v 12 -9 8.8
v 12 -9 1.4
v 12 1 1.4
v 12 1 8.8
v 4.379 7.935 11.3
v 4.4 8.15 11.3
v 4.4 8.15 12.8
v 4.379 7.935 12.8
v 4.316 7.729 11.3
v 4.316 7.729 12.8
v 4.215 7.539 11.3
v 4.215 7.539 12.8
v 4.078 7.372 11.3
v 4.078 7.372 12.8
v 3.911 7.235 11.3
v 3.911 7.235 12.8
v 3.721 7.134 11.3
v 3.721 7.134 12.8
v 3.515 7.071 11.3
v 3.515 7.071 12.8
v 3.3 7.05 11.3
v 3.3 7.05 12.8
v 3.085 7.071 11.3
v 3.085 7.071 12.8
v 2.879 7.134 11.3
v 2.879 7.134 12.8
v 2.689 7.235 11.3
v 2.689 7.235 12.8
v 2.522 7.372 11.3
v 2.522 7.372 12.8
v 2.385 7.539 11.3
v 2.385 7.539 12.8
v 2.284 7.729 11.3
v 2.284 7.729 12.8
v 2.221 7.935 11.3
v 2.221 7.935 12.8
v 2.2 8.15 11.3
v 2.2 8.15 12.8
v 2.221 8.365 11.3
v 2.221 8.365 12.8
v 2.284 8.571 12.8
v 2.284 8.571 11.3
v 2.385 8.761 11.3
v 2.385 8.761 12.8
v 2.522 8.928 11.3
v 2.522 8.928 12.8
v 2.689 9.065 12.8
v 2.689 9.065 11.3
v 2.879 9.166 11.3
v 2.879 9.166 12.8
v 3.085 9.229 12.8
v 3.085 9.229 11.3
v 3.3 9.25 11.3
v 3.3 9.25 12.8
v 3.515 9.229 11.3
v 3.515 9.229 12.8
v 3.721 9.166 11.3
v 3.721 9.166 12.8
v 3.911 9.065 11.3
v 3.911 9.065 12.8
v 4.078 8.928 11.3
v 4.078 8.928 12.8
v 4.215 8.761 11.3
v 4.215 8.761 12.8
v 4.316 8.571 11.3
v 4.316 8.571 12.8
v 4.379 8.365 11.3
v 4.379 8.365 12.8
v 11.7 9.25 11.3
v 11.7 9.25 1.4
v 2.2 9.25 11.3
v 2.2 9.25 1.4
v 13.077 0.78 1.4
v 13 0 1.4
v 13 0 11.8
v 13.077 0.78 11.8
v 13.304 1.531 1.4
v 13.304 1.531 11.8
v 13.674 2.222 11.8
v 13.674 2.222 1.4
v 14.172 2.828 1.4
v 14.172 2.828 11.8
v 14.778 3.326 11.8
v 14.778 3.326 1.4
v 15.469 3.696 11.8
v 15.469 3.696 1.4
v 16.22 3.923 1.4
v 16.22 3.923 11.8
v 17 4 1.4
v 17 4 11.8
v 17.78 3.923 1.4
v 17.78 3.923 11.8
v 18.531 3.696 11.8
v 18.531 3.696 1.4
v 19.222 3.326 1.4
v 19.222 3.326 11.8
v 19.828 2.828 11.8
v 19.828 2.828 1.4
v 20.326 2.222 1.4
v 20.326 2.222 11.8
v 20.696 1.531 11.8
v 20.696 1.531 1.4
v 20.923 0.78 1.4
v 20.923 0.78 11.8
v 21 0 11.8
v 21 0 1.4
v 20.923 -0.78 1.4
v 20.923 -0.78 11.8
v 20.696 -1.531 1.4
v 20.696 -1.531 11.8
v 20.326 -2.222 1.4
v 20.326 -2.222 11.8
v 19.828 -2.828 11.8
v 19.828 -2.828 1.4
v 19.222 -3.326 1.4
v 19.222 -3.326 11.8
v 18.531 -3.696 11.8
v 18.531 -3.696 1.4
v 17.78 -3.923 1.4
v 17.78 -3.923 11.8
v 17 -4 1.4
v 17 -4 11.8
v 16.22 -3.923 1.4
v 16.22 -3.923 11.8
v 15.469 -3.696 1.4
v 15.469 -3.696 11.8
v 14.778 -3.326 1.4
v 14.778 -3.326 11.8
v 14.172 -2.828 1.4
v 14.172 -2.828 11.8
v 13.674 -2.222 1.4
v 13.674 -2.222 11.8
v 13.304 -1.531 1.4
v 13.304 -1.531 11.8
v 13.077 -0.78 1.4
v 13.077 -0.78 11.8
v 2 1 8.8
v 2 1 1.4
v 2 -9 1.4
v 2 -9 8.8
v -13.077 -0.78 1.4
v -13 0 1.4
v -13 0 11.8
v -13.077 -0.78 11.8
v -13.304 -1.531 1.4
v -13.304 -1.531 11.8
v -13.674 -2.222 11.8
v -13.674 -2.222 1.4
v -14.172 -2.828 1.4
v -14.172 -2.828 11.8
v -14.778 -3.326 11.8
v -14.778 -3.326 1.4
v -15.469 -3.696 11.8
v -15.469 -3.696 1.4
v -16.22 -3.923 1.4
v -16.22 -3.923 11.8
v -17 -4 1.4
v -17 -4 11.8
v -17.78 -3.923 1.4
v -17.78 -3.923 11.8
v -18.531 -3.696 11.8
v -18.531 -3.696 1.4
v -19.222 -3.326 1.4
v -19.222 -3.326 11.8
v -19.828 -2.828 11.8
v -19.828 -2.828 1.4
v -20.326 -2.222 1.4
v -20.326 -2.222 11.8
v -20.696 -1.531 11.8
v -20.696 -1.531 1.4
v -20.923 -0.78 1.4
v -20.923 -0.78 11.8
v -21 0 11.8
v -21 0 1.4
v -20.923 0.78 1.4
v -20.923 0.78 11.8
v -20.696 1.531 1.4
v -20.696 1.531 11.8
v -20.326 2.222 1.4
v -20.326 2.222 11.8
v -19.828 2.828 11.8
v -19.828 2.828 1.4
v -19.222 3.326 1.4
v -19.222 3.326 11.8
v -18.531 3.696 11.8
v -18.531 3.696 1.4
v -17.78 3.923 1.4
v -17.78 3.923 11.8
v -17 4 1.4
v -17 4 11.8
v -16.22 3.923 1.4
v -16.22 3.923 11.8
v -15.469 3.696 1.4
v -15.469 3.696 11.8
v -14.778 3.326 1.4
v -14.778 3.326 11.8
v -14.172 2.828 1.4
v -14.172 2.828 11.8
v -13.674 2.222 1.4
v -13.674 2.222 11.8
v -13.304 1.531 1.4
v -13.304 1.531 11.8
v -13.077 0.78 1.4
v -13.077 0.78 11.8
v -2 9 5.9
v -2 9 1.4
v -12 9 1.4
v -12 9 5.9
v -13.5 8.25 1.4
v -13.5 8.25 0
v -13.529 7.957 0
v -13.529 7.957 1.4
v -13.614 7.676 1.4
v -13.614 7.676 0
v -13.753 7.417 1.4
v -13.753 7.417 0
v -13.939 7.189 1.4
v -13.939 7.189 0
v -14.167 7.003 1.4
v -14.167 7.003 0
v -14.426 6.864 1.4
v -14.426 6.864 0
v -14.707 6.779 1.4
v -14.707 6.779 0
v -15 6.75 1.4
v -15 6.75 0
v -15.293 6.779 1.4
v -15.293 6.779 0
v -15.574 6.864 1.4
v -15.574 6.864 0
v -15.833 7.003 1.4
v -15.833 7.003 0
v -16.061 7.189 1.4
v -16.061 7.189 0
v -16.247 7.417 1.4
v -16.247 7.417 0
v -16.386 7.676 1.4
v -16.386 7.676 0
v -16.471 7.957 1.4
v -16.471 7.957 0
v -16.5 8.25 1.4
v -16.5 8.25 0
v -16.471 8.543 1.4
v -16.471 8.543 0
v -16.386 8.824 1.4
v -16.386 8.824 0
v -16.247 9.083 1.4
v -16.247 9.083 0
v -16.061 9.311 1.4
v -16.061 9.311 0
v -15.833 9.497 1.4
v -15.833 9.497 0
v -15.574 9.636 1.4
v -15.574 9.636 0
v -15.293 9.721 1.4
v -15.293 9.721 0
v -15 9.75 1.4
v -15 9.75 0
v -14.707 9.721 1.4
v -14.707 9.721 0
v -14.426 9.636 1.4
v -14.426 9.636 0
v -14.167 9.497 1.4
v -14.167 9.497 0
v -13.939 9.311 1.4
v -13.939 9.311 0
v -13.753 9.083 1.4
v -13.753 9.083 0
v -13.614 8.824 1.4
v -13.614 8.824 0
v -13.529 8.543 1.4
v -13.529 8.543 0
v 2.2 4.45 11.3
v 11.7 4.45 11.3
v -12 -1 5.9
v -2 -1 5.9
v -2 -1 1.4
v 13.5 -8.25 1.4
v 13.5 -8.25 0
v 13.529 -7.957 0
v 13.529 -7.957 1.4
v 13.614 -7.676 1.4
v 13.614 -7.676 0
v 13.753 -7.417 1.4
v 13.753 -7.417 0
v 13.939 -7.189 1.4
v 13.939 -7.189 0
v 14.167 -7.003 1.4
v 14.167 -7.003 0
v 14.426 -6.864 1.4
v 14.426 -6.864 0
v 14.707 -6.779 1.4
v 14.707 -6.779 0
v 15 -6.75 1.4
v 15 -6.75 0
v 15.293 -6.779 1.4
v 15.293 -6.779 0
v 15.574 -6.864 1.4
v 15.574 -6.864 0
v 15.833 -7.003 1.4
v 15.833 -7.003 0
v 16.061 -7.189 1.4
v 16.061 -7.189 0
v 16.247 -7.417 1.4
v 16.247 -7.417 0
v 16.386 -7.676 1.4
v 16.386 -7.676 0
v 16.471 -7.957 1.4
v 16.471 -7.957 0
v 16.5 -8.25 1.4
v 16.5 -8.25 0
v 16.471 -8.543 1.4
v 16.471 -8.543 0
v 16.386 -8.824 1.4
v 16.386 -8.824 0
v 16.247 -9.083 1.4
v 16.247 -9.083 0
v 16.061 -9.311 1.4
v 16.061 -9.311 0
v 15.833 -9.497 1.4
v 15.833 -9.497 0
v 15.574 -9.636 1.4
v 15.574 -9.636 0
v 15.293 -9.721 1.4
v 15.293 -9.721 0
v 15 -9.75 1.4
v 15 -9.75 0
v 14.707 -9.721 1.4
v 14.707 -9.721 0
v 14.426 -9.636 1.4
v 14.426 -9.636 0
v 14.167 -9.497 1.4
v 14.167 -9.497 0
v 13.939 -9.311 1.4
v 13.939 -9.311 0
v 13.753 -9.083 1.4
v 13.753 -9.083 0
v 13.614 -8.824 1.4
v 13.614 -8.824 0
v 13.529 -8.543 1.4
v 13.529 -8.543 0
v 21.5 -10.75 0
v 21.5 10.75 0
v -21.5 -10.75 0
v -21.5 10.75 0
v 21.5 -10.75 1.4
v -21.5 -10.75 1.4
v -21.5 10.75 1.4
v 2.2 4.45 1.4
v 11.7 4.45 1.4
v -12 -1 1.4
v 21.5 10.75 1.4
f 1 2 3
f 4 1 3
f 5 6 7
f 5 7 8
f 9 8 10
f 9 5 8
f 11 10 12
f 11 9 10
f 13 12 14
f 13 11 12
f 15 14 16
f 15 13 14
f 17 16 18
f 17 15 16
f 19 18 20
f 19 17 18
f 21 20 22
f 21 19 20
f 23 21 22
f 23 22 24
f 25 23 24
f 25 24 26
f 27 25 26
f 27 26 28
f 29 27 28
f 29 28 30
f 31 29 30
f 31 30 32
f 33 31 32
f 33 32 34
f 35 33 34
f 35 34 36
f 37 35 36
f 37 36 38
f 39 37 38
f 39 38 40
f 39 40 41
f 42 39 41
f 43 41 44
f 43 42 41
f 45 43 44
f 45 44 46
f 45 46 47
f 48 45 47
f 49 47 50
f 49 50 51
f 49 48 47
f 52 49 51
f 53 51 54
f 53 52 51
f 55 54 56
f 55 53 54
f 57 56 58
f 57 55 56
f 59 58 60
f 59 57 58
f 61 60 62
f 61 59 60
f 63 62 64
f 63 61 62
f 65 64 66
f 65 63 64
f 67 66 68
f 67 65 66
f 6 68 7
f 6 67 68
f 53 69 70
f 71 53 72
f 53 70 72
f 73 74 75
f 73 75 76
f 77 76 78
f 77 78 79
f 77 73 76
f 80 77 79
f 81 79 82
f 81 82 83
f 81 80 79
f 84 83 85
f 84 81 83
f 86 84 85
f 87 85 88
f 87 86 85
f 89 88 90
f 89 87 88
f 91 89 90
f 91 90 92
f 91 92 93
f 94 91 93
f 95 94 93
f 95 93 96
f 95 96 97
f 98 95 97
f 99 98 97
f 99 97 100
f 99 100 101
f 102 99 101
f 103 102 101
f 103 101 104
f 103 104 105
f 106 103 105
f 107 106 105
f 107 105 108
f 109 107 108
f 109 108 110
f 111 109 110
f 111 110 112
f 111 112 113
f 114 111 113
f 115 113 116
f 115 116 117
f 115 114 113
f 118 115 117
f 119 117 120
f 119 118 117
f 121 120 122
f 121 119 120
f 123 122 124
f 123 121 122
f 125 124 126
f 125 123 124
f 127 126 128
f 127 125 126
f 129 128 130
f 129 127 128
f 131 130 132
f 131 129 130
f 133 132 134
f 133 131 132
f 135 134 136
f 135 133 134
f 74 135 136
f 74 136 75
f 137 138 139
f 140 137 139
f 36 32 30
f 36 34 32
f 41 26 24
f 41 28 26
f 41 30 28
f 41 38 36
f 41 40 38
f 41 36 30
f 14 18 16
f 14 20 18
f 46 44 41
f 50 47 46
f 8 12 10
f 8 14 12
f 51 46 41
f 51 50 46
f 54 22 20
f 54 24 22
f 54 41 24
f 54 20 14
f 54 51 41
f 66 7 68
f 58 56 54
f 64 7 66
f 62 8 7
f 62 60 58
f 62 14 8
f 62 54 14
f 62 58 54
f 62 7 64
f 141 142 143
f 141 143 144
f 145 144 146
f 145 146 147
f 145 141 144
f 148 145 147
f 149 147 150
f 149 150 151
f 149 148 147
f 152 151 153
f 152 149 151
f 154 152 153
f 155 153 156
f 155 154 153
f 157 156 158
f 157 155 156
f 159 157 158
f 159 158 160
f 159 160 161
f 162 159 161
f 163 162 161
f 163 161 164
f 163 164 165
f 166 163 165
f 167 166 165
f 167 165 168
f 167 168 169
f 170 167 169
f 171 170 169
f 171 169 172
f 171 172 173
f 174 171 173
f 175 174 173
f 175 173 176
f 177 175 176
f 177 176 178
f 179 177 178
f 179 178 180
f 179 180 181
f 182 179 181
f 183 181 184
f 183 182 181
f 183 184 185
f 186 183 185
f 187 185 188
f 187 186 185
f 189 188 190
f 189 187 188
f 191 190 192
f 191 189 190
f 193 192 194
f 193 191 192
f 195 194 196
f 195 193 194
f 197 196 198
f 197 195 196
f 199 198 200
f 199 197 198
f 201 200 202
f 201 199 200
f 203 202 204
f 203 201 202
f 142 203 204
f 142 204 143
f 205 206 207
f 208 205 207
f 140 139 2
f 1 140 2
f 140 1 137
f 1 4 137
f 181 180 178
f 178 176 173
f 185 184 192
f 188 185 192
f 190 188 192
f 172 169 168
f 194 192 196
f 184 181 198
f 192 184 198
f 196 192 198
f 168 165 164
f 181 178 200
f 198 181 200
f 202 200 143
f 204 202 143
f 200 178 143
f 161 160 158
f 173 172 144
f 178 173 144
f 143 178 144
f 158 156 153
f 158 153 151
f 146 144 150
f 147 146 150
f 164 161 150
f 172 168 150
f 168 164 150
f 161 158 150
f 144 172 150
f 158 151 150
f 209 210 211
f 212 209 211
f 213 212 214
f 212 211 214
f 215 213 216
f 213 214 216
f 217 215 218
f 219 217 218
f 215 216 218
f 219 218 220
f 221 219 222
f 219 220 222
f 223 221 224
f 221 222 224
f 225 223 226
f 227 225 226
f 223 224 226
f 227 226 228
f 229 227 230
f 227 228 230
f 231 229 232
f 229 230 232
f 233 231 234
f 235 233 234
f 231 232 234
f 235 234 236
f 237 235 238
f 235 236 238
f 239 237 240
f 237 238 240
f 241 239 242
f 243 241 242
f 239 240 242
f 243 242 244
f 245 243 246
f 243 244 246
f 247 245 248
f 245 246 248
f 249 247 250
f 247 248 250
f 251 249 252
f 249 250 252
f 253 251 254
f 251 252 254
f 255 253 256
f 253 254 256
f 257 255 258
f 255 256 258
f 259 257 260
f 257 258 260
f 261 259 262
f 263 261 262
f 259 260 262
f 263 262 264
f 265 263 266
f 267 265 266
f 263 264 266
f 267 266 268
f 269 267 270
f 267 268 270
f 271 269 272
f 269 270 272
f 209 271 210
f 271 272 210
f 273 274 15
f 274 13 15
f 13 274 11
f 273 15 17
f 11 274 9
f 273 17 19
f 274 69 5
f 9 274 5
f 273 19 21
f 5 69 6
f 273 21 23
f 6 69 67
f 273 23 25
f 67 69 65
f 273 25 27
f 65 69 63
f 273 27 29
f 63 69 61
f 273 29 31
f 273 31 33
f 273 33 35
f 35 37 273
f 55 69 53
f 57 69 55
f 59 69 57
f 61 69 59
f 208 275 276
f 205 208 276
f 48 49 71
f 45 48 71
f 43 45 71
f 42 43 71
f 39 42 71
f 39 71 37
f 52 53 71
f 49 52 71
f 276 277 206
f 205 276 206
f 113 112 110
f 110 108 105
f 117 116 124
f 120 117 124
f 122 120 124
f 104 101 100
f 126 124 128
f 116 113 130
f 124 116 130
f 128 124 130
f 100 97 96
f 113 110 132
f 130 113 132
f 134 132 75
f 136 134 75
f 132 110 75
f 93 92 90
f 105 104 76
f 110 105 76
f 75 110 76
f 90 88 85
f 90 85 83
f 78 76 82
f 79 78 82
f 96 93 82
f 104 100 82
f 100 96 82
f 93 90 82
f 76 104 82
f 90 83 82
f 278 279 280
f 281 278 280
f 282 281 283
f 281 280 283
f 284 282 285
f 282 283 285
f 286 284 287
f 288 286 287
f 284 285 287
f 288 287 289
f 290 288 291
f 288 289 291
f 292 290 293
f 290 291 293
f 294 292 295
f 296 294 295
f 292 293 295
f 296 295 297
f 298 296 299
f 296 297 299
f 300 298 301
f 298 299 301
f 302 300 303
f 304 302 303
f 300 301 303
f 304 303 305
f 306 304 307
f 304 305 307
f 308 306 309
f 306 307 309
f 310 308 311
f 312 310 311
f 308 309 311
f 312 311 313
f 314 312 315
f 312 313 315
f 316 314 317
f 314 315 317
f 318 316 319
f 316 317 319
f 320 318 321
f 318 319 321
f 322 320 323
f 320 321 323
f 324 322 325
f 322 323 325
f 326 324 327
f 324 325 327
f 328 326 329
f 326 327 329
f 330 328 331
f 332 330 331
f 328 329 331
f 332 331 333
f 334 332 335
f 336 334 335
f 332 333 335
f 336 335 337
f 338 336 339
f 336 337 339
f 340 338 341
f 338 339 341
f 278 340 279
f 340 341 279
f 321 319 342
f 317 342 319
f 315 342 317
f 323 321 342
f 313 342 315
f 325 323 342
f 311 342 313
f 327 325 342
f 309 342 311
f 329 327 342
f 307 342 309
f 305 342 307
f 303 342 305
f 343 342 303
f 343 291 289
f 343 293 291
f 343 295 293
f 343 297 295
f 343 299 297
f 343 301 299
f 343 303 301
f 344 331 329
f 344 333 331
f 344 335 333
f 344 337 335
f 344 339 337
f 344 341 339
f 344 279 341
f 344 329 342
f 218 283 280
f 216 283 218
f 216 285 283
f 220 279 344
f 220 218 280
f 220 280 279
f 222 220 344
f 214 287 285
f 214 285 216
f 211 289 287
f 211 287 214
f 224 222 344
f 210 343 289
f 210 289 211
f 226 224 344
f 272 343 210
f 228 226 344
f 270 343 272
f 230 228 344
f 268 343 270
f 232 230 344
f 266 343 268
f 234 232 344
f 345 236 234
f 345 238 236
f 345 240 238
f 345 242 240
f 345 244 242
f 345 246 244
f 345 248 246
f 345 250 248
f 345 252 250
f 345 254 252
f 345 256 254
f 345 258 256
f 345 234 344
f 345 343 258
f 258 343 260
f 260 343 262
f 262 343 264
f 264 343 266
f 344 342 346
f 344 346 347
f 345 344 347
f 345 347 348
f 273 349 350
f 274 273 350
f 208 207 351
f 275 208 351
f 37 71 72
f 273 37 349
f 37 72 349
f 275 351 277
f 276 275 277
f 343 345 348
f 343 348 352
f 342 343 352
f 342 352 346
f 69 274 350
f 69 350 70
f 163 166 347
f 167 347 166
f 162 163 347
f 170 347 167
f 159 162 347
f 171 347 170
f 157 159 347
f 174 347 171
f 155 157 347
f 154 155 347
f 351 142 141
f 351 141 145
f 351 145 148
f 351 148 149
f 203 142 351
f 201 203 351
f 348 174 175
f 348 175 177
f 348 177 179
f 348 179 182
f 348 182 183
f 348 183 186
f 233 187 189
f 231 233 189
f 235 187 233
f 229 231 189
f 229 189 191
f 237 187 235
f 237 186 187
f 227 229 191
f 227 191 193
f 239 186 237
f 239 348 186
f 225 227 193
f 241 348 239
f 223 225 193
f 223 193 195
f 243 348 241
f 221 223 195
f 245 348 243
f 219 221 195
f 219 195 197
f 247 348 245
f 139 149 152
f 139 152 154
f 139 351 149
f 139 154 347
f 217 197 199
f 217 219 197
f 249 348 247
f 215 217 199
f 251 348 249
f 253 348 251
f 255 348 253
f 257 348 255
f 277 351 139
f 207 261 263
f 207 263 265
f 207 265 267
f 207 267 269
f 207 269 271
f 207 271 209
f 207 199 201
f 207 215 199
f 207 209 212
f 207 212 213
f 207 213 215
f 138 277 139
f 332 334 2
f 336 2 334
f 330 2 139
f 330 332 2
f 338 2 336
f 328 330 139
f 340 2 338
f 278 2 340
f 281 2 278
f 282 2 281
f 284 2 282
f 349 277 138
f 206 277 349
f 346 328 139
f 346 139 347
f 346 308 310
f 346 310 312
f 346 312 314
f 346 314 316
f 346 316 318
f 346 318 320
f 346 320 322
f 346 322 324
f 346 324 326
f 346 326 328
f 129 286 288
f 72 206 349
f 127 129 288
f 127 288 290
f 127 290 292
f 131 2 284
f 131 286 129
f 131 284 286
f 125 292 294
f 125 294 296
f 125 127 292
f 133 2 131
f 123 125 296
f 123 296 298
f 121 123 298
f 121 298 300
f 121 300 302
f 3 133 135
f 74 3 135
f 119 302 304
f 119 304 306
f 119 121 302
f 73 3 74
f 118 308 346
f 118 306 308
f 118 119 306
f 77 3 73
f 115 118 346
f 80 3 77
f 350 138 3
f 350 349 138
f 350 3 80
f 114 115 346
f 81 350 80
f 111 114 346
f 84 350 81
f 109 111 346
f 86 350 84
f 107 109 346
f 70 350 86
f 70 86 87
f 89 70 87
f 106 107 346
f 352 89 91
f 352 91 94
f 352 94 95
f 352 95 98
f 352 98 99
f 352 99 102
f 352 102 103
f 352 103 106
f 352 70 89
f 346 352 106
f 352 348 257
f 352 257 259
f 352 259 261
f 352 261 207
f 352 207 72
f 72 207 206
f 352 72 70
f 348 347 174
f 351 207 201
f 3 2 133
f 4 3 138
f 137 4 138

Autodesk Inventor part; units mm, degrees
sketch "スケッチ1" plane through (0, 0, 0) normal (0, 0, 1) x (1, 0, 0)
  line L0 (-21.5, 10.75) -> (21.5, 10.75)
  line L1 (21.5, 10.75) -> (21.5, -10.75)
  line L2 (21.5, -10.75) -> (-21.5, -10.75)
  line L3 (-21.5, -10.75) -> (-21.5, 10.75)
  line L4 (-21.5, -10.75) -> (21.5, 10.75)
  line L5 (-21.5, 10.75) -> (21.5, -10.75)
  point P0 (0, 0)
  dimension "d0" = 43
  dimension "d1" = 21.5
extrude "押し出し1" add sketch "スケッチ1" along normal blind 1.4
sketch "スケッチ2" plane through (0, 0, 0) normal (0, 0, -1) x (-1, 0, 0)
  circle A0 centre (-15, -8.25) radius 1.5
  point P0 (0, 0)
  dimension "d4" = 3
  dimension "d5" = 15
  dimension "d6" = 8.25
extrude "押し出し2" cut sketch "スケッチ2" against normal through all
sketch "スケッチ3" plane through (0, 0, 0) normal (0, 0, -1) x (-1, 0, 0)
  circle A0 centre (-17, 0) radius 4
  line L0 (-2, -9) -> (-12, -9)
  line L1 (-12, -9) -> (-12, 1)
  line L2 (-12, 1) -> (-2, 1)
  line L3 (-2, 1) -> (-2, -9)
  point P0 (0, 0)
  dimension "d12" = 8
  dimension "d13" = 17
  dimension "d16" = 10
  dimension "d17" = 10
  dimension "d18" = 2
  dimension "d23" = 1
extrude "押し出し3" add sketch "スケッチ3" against normal blind 11.8
pattern_circular "円形状パターン2" count 2 over 360 about axis through (0, 0, -10) along (0, 0, 1) of "押し出し3", "押し出し2"
sketch "スケッチ4" plane through (0, 0, 0) normal (0, 0, -1) x (-1, 0, 0)
  line L0 (-2.2, 4.45) -> (-11.7, 4.45)
  line L1 (-11.7, 4.45) -> (-11.7, 9.25)
  line L2 (-11.7, 9.25) -> (-2.2, 9.25)
  line L3 (-2.2, 9.25) -> (-2.2, 4.45)
  circle A0 centre (15, 8.25) radius 1.5 projected
  circle A1 centre (-15, -8.25) radius 1.5 projected
  line L4 (21.5, -10.75) -> (-21.5, -10.75) projected
  line L5 (21.5, 10.75) -> (21.5, -10.75) projected
  line L6 (-21.5, 10.75) -> (21.5, 10.75) projected
  line L7 (-21.5, -10.75) -> (-21.5, 10.75) projected
  point P0 (0, 0)
  dimension "d24" = 9.5
  dimension "d25" = 4.8
  dimension "d26" = 1.5
  dimension "d27" = 9.8
extrude "押し出し4" add sketch "スケッチ4" against normal blind 11.3 contours L0 L1 L2 L3
sketch "スケッチ5" plane through (0, 0, 11.3) normal (0, 0, 1) x (1, 0, 0)
  line L0 (2.2, 4.45) -> (11.7, 4.45) projected
  line L1 (11.7, 4.45) -> (11.7, 9.25) projected
  line L2 (11.7, 9.25) -> (2.2, 9.25) projected
  line L3 (2.2, 9.25) -> (2.2, 4.45) projected
  circle A0 centre (3.3, 8.15) radius 1.1
  point P0 (0, 0)
  dimension "d30" = 2.2
extrude "押し出し5" add sketch "スケッチ5" along normal blind 1.5 contours A0
move faces "移動1" translate (0, 0, -3) faces at (8.6667, -2.3333, 11.8)
move faces "移動2" translate (0, 0, -5.9) faces at (-5.3333, 5.6667, 11.8)
properties part number "DC-DCconverter"
